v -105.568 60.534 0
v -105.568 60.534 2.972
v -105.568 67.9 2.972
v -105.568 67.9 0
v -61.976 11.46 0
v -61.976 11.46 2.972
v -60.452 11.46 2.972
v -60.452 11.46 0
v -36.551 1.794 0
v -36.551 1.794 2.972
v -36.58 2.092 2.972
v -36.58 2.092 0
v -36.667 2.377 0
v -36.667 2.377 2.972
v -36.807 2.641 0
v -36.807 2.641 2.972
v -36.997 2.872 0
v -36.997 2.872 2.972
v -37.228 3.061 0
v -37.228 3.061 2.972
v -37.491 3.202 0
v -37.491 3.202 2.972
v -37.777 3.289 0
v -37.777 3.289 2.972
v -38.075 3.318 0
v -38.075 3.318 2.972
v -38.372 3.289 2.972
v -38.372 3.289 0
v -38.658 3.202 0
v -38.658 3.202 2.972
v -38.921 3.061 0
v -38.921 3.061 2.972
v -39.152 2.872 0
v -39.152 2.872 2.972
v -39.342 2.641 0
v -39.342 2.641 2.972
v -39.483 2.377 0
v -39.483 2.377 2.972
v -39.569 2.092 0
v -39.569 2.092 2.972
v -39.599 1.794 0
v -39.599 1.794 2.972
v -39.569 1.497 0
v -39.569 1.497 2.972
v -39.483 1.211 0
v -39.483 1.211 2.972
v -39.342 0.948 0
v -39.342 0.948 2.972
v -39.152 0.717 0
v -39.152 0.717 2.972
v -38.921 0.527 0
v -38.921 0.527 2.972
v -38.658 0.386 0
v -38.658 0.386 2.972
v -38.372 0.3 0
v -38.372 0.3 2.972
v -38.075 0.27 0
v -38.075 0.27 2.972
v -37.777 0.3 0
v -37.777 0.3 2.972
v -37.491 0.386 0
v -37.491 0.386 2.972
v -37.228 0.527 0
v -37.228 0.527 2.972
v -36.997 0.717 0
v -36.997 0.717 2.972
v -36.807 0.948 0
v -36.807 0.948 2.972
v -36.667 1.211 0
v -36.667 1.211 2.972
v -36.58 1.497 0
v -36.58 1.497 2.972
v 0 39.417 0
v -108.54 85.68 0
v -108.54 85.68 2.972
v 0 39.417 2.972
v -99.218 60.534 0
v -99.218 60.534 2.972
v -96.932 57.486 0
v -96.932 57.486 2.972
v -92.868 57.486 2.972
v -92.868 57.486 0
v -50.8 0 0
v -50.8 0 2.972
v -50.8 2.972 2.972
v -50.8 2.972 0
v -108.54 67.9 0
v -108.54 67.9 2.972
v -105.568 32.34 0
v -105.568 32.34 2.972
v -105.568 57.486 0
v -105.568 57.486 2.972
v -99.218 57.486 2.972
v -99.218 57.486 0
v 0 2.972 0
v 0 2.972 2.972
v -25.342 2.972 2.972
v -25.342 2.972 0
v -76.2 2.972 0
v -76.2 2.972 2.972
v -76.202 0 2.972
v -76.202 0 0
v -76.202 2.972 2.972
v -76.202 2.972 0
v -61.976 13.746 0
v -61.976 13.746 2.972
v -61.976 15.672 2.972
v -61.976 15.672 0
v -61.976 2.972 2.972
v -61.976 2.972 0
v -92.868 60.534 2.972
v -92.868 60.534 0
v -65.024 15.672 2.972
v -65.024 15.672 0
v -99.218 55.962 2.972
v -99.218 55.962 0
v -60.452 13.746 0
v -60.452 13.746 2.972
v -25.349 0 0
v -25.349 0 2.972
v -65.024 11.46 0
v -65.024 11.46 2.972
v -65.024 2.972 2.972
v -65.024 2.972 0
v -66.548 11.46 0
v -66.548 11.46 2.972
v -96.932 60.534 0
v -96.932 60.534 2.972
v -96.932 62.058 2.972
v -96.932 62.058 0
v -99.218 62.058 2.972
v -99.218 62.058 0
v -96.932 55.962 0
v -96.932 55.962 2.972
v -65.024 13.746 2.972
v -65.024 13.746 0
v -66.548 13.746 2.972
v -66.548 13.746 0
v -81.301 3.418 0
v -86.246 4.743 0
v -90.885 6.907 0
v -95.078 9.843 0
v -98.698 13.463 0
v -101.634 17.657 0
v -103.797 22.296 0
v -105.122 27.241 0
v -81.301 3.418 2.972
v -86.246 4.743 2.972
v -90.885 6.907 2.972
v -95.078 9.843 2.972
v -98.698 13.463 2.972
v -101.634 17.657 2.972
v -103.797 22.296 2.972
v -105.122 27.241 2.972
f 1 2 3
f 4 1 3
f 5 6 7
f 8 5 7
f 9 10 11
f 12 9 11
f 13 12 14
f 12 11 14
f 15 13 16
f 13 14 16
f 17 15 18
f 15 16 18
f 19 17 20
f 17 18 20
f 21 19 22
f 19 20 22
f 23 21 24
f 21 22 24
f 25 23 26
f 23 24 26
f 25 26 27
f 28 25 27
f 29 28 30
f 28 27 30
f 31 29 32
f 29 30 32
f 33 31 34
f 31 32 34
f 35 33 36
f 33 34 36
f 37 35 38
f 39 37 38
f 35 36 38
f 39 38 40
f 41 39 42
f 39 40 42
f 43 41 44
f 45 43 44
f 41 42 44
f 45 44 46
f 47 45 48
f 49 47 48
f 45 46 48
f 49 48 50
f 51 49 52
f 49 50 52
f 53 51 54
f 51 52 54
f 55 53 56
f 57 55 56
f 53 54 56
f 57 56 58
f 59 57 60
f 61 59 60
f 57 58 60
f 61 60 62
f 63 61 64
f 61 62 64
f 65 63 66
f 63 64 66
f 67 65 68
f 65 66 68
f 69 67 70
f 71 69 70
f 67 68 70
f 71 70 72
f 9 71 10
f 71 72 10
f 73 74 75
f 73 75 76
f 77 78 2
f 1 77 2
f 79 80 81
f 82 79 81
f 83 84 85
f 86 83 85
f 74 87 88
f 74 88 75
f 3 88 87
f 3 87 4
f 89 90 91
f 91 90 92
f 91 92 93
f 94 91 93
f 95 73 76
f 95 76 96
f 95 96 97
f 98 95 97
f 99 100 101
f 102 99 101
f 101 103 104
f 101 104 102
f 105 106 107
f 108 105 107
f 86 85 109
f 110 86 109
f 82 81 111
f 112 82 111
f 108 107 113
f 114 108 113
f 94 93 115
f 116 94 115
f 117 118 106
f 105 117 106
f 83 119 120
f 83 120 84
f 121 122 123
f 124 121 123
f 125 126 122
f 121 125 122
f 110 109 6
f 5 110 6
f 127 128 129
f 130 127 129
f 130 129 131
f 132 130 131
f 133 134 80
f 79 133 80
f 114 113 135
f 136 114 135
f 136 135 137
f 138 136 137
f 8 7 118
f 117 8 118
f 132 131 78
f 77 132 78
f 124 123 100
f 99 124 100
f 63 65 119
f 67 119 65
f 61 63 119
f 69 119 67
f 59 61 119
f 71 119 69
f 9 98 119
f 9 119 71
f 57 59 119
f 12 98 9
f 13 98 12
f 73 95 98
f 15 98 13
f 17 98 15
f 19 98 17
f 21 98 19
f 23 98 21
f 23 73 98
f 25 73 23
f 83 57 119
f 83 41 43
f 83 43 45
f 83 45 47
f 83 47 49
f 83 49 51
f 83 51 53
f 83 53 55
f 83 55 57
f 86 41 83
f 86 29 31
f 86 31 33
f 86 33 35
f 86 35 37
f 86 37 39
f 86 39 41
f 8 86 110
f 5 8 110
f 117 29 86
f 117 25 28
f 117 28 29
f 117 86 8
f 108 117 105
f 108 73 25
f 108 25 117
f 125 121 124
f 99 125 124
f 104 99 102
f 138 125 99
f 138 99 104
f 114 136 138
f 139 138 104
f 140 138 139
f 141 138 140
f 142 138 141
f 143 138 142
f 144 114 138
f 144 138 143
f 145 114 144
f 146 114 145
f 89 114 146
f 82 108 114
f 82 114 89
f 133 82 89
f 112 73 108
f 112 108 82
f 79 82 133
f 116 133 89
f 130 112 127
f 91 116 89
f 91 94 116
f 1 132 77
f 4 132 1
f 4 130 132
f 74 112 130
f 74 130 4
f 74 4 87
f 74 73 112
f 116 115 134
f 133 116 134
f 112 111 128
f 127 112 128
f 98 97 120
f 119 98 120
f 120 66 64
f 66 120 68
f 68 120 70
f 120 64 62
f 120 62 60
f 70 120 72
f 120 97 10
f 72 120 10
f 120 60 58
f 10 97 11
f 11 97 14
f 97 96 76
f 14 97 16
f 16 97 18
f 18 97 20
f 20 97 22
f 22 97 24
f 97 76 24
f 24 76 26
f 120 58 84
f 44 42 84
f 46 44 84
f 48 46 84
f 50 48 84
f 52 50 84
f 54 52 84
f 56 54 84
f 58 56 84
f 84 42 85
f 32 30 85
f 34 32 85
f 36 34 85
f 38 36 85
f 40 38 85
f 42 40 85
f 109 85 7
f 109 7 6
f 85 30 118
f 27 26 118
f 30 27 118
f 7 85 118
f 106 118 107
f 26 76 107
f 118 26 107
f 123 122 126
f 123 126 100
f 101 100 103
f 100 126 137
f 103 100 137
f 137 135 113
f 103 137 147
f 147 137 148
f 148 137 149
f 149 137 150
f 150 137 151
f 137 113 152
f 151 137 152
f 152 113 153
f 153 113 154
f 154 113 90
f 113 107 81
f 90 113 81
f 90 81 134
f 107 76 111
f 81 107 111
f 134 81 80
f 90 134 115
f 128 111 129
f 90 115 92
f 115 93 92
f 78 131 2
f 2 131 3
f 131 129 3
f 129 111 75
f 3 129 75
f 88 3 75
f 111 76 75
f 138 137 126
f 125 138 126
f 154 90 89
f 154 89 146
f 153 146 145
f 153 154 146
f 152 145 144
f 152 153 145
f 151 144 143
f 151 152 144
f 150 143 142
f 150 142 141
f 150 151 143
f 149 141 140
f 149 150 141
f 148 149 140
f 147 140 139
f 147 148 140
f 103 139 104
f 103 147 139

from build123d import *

# Parameters (mm, degrees)
BOSS_EXTRUDE1_DEPTH     = 2.9718
SKETCH3_W               = 2.9718
SKETCH3_H               = 17.78
CUT_EXTRUDE4_DEPTH      = 2.9718
CUT_EXTRUDE4_DEPTH_BACK = 3.9718
SKETCH4_R               = 1.524
CUT_EXTRUDE5_DEPTH      = 2.9718
CUT_EXTRUDE6_DEPTH      = 2.9718
CUT_EXTRUDE7_DEPTH      = 1
CUT_EXTRUDE7_DEPTH_BACK = 2.9718


with BuildPart() as part:
    # Sketch1 → Boss-Extrude1 (new body)
    with BuildSketch(Plane.XY):
        with BuildLine():
            Line((0, 0), (-76.2, 0))
            ThreePointArc((-76.2, 0), (-99.068034345, 9.472249971), (-108.540284316, 32.340284316))
            Line((-108.540284316, 32.340284316), (-108.540284316, 85.680284316))
            Line((-108.540284316, 85.680284316), (0, 39.416788246))
            Line((0, 39.416788246), (0, 0))
        make_face()
    extrude(amount=BOSS_EXTRUDE1_DEPTH)

    # Sketch3 → Cut-Extrude4 (cut, two sides)
    with BuildSketch(Plane.XY.offset(2.9718)) as cut_extrude4_sk:
        Polygon((-25.342092582, 2.9718), (-25.349200788, 0), (0, 0), (0, 2.9718), align=None)
        with BuildLine():
            Line((-76.2, 2.9718), (-76.202051529, 6.5e-08))
            ThreePointArc((-76.202051529, 6.5e-08), (-76.201025765, 1.6e-08), (-76.2, 0))
            Line((-76.2, 0), (-50.8, 0))
            Line((-50.8, 0), (-50.8, 2.9718))
            Line((-50.8, 2.9718), (-76.2, 2.9718))
        make_face()
        with Locations((-107.054384316, 59.010284316)):
            Rectangle(SKETCH3_W, SKETCH3_H)
    extrude(amount=CUT_EXTRUDE4_DEPTH, mode=Mode.SUBTRACT)
    extrude(cut_extrude4_sk.sketch, amount=-CUT_EXTRUDE4_DEPTH_BACK, mode=Mode.SUBTRACT)

    # Sketch4 → Cut-Extrude5 (cut)
    with BuildSketch(Plane.XY.offset(2.9718)):
        with Locations((-38.074600394, 1.794277041)):
            Circle(SKETCH4_R)
    extrude(amount=-CUT_EXTRUDE5_DEPTH, mode=Mode.SUBTRACT)

    # Sketch5 → Cut-Extrude6 (cut)
    with BuildSketch(Plane.XY.offset(2.9718)):
        Polygon((-105.568484316, 60.534284316), (-105.568484316, 59.010284316), (-92.868484316, 59.010284316), (-92.868484316, 60.534284316), (-96.932484316, 60.534284316), (-96.932484316, 62.058284316), (-99.218484316, 62.058284316), (-99.218484316, 60.534284316), align=None)
        Polygon((-92.868484316, 59.010284316), (-105.568484316, 59.010284316), (-105.568484316, 57.486284316), (-99.218484316, 57.486284316), (-99.218484316, 55.962284316), (-96.932484316, 55.962284316), (-96.932484316, 57.486284316), (-92.868484316, 57.486284316), align=None)
        Polygon((-65.024, 2.9718), (-63.5, 2.9718), (-63.5, 15.6718), (-65.024, 15.6718), (-65.024, 13.745923506), (-66.548, 13.745923506), (-66.548, 11.459923506), (-65.024, 11.459923506), align=None)
        Polygon((-63.5, 15.6718), (-63.5, 2.9718), (-61.976, 2.9718), (-61.976, 11.459923506), (-60.452, 11.459923506), (-60.452, 13.745923506), (-61.976, 13.745923506), (-61.976, 15.6718), align=None)
    extrude(amount=-CUT_EXTRUDE6_DEPTH, mode=Mode.SUBTRACT)

    # Sketch6 → Cut-Extrude7 (cut, two sides)
    with BuildSketch(Plane.XY.offset(2.9718)) as cut_extrude7_sk:
        with BuildLine():
            ThreePointArc((-105.568484316, 32.340284316), (-96.967313076, 11.574288587), (-76.201863011, 2.971800059))
            Line((-76.201863011, 2.971800059), (-76.202051529, 6.5e-08))
            ThreePointArc((-76.202051529, 6.5e-08), (-99.068759659, 9.472975307), (-108.540284316, 32.340284316))
            Line((-108.540284316, 32.340284316), (-108.540284316, 50.120284316))
            Line((-108.540284316, 50.120284316), (-105.568484316, 50.120284316))
            Line((-105.568484316, 50.120284316), (-105.568484316, 32.340284316))
        make_face()
    extrude(amount=CUT_EXTRUDE7_DEPTH, mode=Mode.SUBTRACT)
    extrude(cut_extrude7_sk.sketch, amount=-CUT_EXTRUDE7_DEPTH_BACK, mode=Mode.SUBTRACT)


solid = part.part
